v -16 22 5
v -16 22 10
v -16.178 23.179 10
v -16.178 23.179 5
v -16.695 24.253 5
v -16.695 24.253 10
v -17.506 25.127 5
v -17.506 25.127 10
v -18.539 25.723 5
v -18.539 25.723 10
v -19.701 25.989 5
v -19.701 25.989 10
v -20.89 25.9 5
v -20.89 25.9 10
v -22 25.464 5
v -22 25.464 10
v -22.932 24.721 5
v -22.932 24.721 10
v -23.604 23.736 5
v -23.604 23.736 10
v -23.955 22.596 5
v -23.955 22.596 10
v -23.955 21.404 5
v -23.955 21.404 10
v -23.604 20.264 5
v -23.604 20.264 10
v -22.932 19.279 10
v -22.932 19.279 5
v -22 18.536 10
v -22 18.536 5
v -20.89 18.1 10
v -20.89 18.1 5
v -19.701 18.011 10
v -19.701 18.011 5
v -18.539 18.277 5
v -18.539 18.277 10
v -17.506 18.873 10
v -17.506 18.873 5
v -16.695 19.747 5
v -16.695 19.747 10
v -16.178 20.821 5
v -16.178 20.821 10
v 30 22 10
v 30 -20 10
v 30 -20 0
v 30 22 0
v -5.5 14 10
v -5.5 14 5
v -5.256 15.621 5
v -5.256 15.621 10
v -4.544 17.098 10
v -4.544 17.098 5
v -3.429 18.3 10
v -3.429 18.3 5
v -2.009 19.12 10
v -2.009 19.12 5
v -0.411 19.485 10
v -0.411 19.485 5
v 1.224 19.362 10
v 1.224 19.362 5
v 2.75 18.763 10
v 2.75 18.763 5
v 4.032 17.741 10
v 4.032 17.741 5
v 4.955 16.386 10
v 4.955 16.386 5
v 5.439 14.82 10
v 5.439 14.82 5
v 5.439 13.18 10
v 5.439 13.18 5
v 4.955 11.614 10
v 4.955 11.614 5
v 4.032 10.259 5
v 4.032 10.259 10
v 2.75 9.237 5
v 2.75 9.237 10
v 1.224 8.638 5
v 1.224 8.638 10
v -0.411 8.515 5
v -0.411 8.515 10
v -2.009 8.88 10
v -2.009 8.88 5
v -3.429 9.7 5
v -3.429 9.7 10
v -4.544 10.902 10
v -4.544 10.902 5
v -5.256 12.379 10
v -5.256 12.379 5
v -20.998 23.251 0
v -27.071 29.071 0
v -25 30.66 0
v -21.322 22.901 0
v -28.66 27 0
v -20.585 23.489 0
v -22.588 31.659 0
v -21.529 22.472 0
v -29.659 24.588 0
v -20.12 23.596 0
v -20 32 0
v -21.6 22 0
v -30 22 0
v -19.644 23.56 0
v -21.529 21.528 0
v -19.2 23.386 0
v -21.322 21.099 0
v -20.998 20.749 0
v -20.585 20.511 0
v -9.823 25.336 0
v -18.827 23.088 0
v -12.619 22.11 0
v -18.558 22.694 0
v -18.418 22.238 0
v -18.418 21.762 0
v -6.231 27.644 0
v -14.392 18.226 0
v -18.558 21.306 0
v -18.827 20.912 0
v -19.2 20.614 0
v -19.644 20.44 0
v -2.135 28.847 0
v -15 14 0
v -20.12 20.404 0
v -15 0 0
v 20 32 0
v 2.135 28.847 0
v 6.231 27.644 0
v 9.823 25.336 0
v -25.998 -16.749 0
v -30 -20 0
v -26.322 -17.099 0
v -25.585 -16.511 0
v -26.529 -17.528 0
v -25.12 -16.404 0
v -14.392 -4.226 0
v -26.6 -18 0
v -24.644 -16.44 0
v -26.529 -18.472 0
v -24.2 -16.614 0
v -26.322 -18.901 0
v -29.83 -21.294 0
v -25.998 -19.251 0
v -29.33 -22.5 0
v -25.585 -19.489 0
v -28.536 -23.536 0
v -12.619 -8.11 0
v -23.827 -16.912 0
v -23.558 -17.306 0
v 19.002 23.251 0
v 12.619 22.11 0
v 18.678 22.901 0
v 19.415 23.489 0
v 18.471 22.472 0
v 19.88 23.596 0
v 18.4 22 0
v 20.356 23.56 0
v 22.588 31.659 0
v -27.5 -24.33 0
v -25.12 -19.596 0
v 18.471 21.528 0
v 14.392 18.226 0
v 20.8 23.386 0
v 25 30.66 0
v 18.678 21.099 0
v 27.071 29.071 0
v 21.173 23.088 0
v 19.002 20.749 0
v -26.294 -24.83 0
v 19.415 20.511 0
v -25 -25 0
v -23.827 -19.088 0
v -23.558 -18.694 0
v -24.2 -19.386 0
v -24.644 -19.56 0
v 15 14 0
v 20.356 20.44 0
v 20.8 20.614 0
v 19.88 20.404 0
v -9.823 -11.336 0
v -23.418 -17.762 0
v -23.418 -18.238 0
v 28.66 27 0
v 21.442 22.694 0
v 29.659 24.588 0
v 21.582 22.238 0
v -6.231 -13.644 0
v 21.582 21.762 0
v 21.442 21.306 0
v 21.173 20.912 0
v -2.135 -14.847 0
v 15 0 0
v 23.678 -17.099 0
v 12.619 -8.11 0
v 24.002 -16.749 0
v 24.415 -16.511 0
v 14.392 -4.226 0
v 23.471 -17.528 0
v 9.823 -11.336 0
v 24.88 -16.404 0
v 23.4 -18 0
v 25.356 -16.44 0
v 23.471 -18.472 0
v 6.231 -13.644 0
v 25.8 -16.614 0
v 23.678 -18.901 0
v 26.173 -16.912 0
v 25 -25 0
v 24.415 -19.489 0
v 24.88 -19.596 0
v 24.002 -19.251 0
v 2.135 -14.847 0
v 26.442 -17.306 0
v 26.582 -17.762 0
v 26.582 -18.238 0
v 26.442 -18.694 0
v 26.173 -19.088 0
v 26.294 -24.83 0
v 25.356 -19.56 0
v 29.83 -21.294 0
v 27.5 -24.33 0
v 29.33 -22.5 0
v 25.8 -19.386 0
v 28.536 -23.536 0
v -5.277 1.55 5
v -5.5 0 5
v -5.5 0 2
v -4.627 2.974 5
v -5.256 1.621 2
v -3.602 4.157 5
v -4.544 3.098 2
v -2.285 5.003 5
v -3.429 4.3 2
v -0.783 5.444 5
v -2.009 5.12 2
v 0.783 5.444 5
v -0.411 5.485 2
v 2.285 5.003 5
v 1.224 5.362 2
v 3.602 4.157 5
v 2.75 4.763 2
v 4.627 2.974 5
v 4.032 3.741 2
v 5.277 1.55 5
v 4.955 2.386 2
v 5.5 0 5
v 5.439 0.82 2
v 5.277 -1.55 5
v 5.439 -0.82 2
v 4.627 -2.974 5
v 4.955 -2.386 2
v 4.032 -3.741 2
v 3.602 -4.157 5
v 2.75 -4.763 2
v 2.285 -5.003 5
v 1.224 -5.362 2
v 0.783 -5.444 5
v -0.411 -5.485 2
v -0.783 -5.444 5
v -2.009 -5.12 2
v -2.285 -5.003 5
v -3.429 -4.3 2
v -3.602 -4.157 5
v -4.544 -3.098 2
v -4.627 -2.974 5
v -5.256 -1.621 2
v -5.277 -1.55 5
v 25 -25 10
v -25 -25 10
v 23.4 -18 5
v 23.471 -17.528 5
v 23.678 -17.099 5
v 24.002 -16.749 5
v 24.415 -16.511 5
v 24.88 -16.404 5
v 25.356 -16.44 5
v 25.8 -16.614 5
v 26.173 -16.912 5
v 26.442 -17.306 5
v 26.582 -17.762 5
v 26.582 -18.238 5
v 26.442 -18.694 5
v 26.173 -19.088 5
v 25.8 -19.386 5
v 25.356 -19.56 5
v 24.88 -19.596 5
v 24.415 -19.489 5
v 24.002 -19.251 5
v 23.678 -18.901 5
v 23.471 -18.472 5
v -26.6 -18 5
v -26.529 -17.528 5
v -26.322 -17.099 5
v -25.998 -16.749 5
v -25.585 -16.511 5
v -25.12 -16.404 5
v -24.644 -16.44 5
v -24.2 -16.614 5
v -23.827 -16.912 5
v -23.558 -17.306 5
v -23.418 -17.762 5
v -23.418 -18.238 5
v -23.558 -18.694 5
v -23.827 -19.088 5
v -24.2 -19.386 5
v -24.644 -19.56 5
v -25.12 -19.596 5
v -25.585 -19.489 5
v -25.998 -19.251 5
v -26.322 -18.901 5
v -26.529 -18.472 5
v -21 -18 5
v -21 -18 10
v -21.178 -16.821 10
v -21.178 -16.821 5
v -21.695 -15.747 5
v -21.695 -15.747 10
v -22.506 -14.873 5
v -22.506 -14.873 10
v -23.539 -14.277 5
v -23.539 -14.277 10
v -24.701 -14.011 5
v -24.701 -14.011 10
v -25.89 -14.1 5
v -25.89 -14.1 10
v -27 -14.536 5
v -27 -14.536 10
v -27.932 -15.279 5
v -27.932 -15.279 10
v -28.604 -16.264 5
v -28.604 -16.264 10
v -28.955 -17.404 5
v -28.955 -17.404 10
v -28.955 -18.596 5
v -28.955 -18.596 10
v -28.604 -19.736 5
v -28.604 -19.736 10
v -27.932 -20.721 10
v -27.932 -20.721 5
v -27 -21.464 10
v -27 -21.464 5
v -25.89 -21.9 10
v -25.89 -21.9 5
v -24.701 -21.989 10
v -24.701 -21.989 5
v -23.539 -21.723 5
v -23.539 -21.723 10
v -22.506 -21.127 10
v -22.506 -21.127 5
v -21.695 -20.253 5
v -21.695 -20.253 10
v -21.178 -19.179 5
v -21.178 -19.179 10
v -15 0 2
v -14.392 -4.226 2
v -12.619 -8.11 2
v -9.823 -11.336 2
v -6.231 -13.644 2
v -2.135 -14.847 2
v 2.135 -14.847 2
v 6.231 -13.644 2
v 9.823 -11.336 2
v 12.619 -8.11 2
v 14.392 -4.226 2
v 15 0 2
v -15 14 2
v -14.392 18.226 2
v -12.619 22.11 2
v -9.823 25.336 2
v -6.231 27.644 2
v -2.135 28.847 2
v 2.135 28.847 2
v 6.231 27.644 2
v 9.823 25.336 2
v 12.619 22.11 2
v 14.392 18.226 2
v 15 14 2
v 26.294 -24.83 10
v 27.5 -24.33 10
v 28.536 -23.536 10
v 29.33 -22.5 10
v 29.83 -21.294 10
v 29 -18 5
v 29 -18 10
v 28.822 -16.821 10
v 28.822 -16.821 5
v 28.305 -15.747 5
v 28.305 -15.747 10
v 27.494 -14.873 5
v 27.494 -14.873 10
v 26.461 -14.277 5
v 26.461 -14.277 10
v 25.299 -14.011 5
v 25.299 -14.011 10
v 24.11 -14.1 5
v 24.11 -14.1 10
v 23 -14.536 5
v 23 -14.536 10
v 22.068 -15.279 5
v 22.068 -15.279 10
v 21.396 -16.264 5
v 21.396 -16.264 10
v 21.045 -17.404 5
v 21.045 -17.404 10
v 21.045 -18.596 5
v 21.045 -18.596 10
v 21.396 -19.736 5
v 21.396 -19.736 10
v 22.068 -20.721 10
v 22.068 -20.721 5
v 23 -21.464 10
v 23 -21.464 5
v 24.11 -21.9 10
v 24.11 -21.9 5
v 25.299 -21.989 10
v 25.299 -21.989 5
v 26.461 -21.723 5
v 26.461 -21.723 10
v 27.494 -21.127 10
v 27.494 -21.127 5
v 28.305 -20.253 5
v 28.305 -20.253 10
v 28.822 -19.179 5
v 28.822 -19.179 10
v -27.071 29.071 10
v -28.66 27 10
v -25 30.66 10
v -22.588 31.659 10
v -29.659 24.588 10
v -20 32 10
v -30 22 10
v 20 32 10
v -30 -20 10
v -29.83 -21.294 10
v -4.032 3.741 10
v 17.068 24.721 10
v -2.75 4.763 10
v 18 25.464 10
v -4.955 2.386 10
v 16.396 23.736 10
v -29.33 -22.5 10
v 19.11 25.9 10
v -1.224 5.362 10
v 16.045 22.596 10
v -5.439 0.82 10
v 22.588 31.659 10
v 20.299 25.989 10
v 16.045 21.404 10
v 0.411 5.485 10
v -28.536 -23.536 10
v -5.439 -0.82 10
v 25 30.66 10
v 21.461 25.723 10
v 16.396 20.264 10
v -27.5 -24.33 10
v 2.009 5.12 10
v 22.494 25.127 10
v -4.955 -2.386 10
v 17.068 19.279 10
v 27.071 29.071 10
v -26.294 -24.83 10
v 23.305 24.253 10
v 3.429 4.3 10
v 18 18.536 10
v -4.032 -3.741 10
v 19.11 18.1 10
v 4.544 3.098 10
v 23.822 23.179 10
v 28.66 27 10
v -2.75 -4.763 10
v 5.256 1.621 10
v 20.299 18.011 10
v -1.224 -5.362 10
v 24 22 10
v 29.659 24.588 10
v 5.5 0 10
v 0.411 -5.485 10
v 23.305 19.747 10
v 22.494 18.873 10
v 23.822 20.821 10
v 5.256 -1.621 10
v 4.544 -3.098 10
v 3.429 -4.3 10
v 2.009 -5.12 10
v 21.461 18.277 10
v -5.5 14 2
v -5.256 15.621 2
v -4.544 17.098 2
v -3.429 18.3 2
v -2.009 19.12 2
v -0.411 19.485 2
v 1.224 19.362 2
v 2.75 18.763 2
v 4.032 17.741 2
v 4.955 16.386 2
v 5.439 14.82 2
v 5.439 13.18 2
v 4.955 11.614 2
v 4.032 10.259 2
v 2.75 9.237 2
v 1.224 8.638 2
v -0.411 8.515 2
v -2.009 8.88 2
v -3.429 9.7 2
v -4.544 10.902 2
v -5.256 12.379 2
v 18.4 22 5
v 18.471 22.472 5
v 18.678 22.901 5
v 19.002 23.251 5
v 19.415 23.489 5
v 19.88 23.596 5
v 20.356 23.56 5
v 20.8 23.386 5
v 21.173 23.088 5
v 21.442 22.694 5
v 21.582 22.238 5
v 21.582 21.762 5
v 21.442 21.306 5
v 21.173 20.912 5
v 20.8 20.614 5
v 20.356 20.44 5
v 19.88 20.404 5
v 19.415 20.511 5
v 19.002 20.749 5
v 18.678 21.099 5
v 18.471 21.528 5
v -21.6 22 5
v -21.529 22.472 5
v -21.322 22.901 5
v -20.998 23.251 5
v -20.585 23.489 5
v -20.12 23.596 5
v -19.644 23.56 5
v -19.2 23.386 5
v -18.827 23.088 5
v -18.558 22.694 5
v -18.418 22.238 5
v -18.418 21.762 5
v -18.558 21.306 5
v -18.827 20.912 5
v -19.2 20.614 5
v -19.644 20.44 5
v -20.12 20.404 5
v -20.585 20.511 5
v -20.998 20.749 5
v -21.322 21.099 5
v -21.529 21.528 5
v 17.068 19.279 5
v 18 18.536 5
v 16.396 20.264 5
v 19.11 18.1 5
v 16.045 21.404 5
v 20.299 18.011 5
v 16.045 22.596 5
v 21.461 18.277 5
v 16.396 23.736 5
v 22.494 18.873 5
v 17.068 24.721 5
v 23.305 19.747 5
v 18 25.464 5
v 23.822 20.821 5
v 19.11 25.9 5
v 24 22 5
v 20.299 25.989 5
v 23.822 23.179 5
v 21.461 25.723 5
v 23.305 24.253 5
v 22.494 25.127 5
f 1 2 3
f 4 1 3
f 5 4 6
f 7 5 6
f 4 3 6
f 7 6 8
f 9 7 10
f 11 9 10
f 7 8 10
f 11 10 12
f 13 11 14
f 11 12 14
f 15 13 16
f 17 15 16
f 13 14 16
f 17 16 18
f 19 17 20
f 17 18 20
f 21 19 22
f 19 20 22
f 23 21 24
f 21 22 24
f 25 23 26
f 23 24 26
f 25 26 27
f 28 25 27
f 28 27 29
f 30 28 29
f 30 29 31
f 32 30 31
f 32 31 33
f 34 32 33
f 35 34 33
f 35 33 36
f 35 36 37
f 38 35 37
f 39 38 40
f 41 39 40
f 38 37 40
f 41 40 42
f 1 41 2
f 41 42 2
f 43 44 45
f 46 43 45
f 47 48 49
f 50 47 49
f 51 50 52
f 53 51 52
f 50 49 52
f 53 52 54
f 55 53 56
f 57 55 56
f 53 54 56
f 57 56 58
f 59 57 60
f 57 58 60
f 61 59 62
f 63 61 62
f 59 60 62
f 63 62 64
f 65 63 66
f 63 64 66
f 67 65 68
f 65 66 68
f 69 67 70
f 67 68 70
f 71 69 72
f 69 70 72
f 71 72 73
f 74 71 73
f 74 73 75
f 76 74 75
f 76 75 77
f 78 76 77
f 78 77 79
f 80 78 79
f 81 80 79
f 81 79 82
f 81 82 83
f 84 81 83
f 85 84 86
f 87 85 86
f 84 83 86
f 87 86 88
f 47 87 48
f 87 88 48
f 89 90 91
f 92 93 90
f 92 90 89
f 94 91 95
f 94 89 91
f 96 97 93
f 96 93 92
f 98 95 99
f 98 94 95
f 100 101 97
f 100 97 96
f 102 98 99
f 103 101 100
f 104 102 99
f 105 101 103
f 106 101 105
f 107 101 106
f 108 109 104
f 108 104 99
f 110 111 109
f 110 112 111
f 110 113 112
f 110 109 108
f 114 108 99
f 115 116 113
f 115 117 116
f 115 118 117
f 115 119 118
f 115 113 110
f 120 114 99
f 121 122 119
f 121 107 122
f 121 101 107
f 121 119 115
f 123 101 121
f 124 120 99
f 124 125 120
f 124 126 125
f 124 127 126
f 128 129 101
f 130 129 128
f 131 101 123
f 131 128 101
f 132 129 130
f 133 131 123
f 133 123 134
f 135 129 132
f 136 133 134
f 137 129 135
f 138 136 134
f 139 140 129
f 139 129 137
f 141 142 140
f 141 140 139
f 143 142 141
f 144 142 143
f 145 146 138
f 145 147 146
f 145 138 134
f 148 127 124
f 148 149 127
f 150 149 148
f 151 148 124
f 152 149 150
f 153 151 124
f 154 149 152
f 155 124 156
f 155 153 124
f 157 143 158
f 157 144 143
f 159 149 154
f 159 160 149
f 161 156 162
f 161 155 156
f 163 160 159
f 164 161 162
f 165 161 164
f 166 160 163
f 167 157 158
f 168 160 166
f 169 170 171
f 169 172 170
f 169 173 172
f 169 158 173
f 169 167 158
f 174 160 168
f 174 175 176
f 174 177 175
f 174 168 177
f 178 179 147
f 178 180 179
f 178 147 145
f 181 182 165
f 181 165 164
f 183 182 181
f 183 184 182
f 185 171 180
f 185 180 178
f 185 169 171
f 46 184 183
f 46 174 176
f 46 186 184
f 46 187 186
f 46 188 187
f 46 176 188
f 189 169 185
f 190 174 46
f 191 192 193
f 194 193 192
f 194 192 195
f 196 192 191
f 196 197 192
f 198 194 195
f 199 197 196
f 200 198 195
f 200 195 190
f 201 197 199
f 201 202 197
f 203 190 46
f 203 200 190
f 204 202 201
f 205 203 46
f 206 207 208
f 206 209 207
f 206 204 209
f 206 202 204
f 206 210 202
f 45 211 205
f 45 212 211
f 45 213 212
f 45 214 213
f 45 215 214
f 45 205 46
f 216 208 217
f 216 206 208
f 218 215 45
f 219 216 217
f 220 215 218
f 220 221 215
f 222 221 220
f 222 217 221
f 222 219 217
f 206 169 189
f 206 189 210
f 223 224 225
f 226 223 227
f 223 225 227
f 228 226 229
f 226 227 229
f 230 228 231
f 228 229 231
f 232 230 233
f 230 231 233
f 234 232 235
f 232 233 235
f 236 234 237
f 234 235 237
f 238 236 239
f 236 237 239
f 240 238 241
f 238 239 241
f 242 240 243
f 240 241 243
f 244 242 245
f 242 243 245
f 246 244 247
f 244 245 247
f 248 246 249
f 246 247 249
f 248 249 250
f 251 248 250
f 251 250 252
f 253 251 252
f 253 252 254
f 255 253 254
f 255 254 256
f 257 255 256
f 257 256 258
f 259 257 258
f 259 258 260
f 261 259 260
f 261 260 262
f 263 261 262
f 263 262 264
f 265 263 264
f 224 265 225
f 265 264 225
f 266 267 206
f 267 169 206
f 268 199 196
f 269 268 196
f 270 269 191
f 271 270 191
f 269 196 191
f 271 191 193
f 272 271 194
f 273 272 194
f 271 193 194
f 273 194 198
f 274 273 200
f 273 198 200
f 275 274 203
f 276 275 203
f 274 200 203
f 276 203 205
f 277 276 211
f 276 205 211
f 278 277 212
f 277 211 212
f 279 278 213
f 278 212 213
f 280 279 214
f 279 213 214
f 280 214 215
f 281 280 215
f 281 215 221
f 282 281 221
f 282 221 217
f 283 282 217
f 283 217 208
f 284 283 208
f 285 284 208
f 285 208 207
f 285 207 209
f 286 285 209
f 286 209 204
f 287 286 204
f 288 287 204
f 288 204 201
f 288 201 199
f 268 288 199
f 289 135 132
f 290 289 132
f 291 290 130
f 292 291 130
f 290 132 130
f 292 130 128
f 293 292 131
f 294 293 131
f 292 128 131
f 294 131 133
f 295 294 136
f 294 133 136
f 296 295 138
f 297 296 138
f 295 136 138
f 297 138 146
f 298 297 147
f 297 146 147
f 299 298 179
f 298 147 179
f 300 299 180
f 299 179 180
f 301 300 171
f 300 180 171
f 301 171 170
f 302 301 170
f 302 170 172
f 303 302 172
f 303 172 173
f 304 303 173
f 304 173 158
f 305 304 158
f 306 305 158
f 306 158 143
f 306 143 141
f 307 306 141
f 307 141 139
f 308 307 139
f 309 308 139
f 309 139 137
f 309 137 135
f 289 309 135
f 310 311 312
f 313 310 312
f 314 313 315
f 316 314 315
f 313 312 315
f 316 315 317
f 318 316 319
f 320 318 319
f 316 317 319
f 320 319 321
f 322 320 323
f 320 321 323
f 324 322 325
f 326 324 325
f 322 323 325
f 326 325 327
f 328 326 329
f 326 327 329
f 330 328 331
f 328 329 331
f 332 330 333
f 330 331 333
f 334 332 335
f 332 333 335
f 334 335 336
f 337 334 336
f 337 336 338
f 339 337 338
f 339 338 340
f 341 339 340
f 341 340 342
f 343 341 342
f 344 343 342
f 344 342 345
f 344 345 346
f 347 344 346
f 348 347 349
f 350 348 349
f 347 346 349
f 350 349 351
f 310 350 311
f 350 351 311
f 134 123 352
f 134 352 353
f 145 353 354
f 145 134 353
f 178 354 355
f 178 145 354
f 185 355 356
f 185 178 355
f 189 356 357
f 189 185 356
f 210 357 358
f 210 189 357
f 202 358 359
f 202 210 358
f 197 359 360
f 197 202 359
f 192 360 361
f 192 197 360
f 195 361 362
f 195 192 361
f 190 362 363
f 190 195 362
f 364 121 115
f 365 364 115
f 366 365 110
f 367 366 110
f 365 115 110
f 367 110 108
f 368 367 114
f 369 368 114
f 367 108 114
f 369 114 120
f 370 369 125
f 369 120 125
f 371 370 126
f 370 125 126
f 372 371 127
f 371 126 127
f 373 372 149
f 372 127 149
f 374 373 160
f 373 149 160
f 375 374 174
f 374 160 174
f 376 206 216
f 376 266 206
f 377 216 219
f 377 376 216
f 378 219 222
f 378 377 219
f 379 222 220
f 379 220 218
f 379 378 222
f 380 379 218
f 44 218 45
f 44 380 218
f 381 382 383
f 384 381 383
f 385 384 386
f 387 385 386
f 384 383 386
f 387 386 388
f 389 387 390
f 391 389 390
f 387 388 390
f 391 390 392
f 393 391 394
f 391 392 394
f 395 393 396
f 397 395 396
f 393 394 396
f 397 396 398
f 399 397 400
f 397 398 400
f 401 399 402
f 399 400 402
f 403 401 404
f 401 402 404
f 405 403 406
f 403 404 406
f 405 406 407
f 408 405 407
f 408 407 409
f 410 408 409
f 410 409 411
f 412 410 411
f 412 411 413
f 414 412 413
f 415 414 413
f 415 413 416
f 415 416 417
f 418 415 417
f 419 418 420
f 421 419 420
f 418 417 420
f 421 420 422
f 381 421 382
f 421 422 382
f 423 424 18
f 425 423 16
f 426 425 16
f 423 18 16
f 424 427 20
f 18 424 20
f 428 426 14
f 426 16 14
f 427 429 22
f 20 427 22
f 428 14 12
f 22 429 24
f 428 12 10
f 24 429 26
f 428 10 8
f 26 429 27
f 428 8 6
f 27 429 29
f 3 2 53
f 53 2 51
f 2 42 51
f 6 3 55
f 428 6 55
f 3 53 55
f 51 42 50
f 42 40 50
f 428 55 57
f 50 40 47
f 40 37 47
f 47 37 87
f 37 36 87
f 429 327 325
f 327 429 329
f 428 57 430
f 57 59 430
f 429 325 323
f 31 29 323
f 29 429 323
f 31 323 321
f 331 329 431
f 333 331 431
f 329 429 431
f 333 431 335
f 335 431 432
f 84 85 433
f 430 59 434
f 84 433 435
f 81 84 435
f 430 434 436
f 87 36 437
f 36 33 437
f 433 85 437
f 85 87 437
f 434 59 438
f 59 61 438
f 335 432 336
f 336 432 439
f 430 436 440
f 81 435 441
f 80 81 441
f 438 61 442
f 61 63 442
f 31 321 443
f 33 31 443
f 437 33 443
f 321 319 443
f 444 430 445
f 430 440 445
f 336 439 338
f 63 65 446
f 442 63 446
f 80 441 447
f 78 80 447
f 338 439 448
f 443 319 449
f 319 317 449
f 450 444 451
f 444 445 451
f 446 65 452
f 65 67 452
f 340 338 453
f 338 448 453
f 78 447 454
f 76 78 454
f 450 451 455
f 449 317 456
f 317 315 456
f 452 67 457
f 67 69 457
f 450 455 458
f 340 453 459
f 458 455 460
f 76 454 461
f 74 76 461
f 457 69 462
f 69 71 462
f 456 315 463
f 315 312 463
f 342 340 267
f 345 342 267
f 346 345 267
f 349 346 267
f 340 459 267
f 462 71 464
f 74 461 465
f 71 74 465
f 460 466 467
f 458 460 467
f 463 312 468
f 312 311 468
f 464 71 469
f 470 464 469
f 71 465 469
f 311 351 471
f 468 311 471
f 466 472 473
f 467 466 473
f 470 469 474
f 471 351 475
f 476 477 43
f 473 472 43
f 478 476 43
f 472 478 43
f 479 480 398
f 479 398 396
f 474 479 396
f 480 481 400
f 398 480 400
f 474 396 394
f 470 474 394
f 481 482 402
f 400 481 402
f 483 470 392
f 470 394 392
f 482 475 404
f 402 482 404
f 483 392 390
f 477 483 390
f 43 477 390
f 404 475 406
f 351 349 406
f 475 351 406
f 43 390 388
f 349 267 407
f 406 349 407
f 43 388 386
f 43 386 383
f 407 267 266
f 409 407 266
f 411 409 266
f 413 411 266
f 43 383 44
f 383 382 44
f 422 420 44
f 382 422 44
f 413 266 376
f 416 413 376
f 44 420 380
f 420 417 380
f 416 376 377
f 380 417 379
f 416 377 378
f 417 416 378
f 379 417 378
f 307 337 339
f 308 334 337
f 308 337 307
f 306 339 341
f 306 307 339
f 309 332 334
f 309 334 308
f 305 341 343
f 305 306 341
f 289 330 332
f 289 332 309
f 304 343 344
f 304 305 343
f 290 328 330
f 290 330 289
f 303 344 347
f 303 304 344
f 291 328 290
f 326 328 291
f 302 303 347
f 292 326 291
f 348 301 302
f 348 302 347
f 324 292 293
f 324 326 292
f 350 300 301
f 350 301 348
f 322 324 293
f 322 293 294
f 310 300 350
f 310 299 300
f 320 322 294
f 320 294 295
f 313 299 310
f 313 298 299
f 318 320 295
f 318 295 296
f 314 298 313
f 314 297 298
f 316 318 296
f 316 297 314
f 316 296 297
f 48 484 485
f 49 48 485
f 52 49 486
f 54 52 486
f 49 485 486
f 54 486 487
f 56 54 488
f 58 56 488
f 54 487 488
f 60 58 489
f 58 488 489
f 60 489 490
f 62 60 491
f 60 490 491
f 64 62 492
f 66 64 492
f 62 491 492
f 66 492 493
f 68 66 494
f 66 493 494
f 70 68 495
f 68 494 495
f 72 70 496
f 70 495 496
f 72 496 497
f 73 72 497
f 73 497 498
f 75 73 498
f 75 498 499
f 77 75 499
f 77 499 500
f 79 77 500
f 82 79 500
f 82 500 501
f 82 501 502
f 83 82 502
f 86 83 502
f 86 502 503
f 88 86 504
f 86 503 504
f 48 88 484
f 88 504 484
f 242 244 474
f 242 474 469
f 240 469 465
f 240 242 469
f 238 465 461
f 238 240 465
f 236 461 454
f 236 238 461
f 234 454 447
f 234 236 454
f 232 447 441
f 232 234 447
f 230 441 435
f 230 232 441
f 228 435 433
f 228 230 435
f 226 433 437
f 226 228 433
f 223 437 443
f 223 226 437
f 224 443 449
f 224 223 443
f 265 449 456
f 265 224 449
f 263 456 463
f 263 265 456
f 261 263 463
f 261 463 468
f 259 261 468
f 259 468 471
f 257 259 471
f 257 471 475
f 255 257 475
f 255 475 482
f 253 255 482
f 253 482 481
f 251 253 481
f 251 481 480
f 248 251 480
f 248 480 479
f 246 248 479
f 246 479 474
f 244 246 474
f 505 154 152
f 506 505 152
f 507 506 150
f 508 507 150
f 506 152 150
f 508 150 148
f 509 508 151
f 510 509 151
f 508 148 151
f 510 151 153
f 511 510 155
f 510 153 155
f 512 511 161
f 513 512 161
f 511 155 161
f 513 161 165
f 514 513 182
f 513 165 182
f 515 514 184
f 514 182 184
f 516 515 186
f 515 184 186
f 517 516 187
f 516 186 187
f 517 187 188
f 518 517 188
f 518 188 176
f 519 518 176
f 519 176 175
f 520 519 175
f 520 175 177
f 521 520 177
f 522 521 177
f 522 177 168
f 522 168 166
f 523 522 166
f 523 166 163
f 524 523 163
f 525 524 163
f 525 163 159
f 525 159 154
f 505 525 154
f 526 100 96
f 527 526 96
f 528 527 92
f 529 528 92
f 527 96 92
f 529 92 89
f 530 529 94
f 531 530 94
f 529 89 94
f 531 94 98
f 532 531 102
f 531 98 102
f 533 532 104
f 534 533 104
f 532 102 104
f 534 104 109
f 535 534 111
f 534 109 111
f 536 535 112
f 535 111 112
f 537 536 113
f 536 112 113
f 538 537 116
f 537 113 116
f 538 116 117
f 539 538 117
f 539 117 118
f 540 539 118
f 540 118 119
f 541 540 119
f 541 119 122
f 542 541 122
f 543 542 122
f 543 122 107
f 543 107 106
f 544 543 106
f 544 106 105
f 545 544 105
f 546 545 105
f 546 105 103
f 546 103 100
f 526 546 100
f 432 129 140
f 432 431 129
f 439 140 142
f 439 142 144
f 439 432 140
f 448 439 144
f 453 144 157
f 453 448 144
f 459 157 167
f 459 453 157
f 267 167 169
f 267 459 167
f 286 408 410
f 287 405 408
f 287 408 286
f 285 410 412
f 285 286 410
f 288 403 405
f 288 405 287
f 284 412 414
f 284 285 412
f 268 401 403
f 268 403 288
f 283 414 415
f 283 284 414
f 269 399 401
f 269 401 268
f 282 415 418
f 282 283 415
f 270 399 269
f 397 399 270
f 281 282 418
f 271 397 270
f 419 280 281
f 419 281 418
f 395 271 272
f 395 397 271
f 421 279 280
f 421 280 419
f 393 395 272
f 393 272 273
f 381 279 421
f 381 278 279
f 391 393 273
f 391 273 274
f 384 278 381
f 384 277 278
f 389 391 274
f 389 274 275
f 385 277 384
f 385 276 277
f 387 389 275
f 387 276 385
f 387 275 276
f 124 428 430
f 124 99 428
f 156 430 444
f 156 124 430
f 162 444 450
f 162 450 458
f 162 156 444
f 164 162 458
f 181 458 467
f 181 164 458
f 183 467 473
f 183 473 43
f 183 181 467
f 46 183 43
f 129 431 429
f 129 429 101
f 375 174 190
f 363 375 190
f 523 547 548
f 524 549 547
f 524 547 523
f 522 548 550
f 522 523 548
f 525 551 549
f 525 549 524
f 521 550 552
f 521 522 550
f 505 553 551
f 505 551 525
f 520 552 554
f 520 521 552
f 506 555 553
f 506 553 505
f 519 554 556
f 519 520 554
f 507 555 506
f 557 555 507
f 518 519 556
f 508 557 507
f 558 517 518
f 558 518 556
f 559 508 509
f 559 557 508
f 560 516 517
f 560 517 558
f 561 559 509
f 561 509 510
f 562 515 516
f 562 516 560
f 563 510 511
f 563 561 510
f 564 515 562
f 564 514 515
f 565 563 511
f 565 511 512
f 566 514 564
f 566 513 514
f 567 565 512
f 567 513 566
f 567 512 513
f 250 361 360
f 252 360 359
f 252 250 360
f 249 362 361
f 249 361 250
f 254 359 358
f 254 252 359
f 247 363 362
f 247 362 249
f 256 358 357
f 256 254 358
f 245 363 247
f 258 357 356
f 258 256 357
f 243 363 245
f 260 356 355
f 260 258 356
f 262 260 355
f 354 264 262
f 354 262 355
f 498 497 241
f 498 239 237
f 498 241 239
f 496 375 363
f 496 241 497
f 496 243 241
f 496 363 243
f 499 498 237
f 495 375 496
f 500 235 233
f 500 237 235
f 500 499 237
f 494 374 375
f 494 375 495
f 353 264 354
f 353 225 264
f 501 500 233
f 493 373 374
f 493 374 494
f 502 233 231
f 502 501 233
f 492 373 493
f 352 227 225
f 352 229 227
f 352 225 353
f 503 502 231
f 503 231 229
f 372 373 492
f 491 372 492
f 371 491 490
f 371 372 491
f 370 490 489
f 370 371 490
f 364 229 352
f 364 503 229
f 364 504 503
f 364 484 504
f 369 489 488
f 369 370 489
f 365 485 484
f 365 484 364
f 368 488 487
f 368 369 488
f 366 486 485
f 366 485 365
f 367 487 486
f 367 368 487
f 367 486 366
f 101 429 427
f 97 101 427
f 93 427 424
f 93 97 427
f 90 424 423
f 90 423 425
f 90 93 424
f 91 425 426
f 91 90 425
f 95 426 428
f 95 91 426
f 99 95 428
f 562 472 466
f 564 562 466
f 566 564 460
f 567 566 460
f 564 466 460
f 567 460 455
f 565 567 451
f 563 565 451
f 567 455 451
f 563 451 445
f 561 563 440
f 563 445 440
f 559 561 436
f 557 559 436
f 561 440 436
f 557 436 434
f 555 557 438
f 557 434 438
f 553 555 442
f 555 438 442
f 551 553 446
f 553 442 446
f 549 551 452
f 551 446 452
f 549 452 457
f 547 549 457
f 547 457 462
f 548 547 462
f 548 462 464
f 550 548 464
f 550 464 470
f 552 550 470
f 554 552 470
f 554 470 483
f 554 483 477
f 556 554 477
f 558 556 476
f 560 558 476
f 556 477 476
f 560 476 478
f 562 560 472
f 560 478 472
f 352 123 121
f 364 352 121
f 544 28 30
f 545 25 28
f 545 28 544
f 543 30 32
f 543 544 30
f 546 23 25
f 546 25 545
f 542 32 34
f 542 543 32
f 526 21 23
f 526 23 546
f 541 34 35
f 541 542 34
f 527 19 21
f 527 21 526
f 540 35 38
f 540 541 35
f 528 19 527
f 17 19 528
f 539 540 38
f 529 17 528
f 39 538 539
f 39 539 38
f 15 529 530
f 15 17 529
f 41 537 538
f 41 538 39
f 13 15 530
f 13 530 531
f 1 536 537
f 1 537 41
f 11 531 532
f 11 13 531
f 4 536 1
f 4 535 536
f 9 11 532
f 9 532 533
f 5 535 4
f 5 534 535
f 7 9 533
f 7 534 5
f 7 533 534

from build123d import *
from build123d.topology import SkipClean

# Parameters (mm, degrees)
SKETCH_1_W          = 60
SKETCH_1_H          = 50
SKETCH_1_R          = 15
EXTRUDE_5_DEPTH     = 5
SKETCH_4_W          = 60
SKETCH_4_H          = 50
SKETCH_4_R          = 5.5
EXTRUDE_6_DEPTH     = 5
SKETCH_5_R          = 1.6
CUT_EXTRUDE_1_DEPTH = 10
SKETCH_6_W          = 60
SKETCH_6_H          = 10
EXTRUDE_7_DEPTH     = 7
FILLET_3_R          = 10
SKETCH_7_R          = 4
CUT_EXTRUDE_2_DEPTH = 5
FILLET_5_R          = 10
FILLET_6_R          = 5
FILLET_7_R          = 5
CUT_EXTRUDE_4_DEPTH = 5
SKETCH_10_R         = 5.5
CUT_EXTRUDE_5_DEPTH = 5
EXTRUDE_START       = 3
SKETCH_11_R         = 5.5
EXTRUDE_8_DEPTH     = 3


with BuildPart() as part:
    # 草图1 → 凸台-拉伸5 (new body)
    with BuildSketch(Plane.XY):
        Rectangle(SKETCH_1_W, SKETCH_1_H)
        Circle(SKETCH_1_R, mode=Mode.SUBTRACT)
    extrude(amount=EXTRUDE_5_DEPTH)

    # 草图4 → 凸台-拉伸6 (add)
    with BuildSketch(Plane.XY.offset(5)):
        Rectangle(SKETCH_4_W, SKETCH_4_H)
        Circle(SKETCH_4_R, mode=Mode.SUBTRACT)
    extrude(amount=EXTRUDE_6_DEPTH)

    # 草图5 → 切除-拉伸1 (cut)
    with BuildSketch(Plane(origin=(0, 0, 0), x_dir=(-1, 0, 0), z_dir=(0, 0, -1))):
        with Locations((-20, 22)):
            Circle(SKETCH_5_R)
        with Locations((-25, -18)):
            Circle(SKETCH_5_R)
        with Locations((20, 22)):
            Circle(SKETCH_5_R)
        with Locations((25, -18)):
            Circle(SKETCH_5_R)
    extrude(amount=-CUT_EXTRUDE_1_DEPTH, mode=Mode.SUBTRACT)

    # 草图6 → 凸台-拉伸7 (add)
    with BuildSketch(Plane(origin=(0, 25, 0), x_dir=(1, 0, 0), z_dir=(0, 1, 0))):
        with Locations((0, -5)):
            Rectangle(SKETCH_6_W, SKETCH_6_H)
    extrude(amount=EXTRUDE_7_DEPTH)

    # 圆角3
    fillet_3_edges = [part.edges().sort_by_distance(p)[0] for p in [
        (-30, 32, 5),
    ]]
    fillet(fillet_3_edges, radius=FILLET_3_R)

    # 草图7 → 切除-拉伸2 (cut)
    with BuildSketch(Plane.XY.offset(10)):
        with Locations((-20, 22)):
            Circle(SKETCH_7_R)
        with Locations((20, 22)):
            Circle(SKETCH_7_R)
        with Locations((-25, -18)):
            Circle(SKETCH_7_R)
        with Locations((25, -18)):
            Circle(SKETCH_7_R)
    extrude(amount=-CUT_EXTRUDE_2_DEPTH, mode=Mode.SUBTRACT)

    # 圆角5
    fillet_5_edges = [part.edges().sort_by_distance(p)[0] for p in [
        (30, 32, 5),
    ]]
    fillet(fillet_5_edges, radius=FILLET_5_R)

    # 圆角6
    fillet_6_edges = [part.edges().sort_by_distance(p)[0] for p in [
        (-30, -25, 5),
    ]]
    fillet(fillet_6_edges, radius=FILLET_6_R)

    # 圆角7
    fillet_7_edges = [part.edges().sort_by_distance(p)[0] for p in [
        (30, -25, 5),
    ]]
    fillet(fillet_7_edges, radius=FILLET_7_R)

    # 草图8 → 切除-拉伸4 (cut)
    with BuildSketch(Plane(origin=(0, 0, 0), x_dir=(-1, 0, 0), z_dir=(0, 0, -1))):
        with BuildLine():
            ThreePointArc((-15, 0), (0, 15), (15, 0))
            Line((15, 0), (15, 14))
            ThreePointArc((15, 14), (0, 29), (-15, 14))
            Line((-15, 14), (-15, 0))
        make_face()
    extrude(amount=-CUT_EXTRUDE_4_DEPTH, mode=Mode.SUBTRACT)

    # 草图10 → 切除-拉伸5 (cut)
    with BuildSketch(Plane(origin=(0, 0, 5), x_dir=(-1, 0, 0), z_dir=(0, 0, -1))):
        with Locations((0, 14)):
            Circle(SKETCH_10_R)
    extrude(amount=-CUT_EXTRUDE_5_DEPTH, mode=Mode.SUBTRACT)

    # 草图11 → 凸台-拉伸8 (add)
    with SkipClean():  # the faces are left unmerged after this step: merging them gives an invalid solid
        with BuildSketch(Plane(origin=(0, 0, 5), x_dir=(-1, 0, 0), z_dir=(0, 0, -1)).offset(EXTRUDE_START)):
            with BuildLine():
                Line((-15, 14), (-15, 0))
                ThreePointArc((-15, 0), (0, -15), (15, 0))
                Line((15, 0), (15, 14))
                ThreePointArc((15, 14), (0, 29), (-15, 14))
            make_face()
            with Locations((0, 14)):
                Circle(SKETCH_11_R, mode=Mode.SUBTRACT)
            Circle(SKETCH_11_R, mode=Mode.SUBTRACT)
        extrude(amount=-EXTRUDE_8_DEPTH)


solid = part.part
